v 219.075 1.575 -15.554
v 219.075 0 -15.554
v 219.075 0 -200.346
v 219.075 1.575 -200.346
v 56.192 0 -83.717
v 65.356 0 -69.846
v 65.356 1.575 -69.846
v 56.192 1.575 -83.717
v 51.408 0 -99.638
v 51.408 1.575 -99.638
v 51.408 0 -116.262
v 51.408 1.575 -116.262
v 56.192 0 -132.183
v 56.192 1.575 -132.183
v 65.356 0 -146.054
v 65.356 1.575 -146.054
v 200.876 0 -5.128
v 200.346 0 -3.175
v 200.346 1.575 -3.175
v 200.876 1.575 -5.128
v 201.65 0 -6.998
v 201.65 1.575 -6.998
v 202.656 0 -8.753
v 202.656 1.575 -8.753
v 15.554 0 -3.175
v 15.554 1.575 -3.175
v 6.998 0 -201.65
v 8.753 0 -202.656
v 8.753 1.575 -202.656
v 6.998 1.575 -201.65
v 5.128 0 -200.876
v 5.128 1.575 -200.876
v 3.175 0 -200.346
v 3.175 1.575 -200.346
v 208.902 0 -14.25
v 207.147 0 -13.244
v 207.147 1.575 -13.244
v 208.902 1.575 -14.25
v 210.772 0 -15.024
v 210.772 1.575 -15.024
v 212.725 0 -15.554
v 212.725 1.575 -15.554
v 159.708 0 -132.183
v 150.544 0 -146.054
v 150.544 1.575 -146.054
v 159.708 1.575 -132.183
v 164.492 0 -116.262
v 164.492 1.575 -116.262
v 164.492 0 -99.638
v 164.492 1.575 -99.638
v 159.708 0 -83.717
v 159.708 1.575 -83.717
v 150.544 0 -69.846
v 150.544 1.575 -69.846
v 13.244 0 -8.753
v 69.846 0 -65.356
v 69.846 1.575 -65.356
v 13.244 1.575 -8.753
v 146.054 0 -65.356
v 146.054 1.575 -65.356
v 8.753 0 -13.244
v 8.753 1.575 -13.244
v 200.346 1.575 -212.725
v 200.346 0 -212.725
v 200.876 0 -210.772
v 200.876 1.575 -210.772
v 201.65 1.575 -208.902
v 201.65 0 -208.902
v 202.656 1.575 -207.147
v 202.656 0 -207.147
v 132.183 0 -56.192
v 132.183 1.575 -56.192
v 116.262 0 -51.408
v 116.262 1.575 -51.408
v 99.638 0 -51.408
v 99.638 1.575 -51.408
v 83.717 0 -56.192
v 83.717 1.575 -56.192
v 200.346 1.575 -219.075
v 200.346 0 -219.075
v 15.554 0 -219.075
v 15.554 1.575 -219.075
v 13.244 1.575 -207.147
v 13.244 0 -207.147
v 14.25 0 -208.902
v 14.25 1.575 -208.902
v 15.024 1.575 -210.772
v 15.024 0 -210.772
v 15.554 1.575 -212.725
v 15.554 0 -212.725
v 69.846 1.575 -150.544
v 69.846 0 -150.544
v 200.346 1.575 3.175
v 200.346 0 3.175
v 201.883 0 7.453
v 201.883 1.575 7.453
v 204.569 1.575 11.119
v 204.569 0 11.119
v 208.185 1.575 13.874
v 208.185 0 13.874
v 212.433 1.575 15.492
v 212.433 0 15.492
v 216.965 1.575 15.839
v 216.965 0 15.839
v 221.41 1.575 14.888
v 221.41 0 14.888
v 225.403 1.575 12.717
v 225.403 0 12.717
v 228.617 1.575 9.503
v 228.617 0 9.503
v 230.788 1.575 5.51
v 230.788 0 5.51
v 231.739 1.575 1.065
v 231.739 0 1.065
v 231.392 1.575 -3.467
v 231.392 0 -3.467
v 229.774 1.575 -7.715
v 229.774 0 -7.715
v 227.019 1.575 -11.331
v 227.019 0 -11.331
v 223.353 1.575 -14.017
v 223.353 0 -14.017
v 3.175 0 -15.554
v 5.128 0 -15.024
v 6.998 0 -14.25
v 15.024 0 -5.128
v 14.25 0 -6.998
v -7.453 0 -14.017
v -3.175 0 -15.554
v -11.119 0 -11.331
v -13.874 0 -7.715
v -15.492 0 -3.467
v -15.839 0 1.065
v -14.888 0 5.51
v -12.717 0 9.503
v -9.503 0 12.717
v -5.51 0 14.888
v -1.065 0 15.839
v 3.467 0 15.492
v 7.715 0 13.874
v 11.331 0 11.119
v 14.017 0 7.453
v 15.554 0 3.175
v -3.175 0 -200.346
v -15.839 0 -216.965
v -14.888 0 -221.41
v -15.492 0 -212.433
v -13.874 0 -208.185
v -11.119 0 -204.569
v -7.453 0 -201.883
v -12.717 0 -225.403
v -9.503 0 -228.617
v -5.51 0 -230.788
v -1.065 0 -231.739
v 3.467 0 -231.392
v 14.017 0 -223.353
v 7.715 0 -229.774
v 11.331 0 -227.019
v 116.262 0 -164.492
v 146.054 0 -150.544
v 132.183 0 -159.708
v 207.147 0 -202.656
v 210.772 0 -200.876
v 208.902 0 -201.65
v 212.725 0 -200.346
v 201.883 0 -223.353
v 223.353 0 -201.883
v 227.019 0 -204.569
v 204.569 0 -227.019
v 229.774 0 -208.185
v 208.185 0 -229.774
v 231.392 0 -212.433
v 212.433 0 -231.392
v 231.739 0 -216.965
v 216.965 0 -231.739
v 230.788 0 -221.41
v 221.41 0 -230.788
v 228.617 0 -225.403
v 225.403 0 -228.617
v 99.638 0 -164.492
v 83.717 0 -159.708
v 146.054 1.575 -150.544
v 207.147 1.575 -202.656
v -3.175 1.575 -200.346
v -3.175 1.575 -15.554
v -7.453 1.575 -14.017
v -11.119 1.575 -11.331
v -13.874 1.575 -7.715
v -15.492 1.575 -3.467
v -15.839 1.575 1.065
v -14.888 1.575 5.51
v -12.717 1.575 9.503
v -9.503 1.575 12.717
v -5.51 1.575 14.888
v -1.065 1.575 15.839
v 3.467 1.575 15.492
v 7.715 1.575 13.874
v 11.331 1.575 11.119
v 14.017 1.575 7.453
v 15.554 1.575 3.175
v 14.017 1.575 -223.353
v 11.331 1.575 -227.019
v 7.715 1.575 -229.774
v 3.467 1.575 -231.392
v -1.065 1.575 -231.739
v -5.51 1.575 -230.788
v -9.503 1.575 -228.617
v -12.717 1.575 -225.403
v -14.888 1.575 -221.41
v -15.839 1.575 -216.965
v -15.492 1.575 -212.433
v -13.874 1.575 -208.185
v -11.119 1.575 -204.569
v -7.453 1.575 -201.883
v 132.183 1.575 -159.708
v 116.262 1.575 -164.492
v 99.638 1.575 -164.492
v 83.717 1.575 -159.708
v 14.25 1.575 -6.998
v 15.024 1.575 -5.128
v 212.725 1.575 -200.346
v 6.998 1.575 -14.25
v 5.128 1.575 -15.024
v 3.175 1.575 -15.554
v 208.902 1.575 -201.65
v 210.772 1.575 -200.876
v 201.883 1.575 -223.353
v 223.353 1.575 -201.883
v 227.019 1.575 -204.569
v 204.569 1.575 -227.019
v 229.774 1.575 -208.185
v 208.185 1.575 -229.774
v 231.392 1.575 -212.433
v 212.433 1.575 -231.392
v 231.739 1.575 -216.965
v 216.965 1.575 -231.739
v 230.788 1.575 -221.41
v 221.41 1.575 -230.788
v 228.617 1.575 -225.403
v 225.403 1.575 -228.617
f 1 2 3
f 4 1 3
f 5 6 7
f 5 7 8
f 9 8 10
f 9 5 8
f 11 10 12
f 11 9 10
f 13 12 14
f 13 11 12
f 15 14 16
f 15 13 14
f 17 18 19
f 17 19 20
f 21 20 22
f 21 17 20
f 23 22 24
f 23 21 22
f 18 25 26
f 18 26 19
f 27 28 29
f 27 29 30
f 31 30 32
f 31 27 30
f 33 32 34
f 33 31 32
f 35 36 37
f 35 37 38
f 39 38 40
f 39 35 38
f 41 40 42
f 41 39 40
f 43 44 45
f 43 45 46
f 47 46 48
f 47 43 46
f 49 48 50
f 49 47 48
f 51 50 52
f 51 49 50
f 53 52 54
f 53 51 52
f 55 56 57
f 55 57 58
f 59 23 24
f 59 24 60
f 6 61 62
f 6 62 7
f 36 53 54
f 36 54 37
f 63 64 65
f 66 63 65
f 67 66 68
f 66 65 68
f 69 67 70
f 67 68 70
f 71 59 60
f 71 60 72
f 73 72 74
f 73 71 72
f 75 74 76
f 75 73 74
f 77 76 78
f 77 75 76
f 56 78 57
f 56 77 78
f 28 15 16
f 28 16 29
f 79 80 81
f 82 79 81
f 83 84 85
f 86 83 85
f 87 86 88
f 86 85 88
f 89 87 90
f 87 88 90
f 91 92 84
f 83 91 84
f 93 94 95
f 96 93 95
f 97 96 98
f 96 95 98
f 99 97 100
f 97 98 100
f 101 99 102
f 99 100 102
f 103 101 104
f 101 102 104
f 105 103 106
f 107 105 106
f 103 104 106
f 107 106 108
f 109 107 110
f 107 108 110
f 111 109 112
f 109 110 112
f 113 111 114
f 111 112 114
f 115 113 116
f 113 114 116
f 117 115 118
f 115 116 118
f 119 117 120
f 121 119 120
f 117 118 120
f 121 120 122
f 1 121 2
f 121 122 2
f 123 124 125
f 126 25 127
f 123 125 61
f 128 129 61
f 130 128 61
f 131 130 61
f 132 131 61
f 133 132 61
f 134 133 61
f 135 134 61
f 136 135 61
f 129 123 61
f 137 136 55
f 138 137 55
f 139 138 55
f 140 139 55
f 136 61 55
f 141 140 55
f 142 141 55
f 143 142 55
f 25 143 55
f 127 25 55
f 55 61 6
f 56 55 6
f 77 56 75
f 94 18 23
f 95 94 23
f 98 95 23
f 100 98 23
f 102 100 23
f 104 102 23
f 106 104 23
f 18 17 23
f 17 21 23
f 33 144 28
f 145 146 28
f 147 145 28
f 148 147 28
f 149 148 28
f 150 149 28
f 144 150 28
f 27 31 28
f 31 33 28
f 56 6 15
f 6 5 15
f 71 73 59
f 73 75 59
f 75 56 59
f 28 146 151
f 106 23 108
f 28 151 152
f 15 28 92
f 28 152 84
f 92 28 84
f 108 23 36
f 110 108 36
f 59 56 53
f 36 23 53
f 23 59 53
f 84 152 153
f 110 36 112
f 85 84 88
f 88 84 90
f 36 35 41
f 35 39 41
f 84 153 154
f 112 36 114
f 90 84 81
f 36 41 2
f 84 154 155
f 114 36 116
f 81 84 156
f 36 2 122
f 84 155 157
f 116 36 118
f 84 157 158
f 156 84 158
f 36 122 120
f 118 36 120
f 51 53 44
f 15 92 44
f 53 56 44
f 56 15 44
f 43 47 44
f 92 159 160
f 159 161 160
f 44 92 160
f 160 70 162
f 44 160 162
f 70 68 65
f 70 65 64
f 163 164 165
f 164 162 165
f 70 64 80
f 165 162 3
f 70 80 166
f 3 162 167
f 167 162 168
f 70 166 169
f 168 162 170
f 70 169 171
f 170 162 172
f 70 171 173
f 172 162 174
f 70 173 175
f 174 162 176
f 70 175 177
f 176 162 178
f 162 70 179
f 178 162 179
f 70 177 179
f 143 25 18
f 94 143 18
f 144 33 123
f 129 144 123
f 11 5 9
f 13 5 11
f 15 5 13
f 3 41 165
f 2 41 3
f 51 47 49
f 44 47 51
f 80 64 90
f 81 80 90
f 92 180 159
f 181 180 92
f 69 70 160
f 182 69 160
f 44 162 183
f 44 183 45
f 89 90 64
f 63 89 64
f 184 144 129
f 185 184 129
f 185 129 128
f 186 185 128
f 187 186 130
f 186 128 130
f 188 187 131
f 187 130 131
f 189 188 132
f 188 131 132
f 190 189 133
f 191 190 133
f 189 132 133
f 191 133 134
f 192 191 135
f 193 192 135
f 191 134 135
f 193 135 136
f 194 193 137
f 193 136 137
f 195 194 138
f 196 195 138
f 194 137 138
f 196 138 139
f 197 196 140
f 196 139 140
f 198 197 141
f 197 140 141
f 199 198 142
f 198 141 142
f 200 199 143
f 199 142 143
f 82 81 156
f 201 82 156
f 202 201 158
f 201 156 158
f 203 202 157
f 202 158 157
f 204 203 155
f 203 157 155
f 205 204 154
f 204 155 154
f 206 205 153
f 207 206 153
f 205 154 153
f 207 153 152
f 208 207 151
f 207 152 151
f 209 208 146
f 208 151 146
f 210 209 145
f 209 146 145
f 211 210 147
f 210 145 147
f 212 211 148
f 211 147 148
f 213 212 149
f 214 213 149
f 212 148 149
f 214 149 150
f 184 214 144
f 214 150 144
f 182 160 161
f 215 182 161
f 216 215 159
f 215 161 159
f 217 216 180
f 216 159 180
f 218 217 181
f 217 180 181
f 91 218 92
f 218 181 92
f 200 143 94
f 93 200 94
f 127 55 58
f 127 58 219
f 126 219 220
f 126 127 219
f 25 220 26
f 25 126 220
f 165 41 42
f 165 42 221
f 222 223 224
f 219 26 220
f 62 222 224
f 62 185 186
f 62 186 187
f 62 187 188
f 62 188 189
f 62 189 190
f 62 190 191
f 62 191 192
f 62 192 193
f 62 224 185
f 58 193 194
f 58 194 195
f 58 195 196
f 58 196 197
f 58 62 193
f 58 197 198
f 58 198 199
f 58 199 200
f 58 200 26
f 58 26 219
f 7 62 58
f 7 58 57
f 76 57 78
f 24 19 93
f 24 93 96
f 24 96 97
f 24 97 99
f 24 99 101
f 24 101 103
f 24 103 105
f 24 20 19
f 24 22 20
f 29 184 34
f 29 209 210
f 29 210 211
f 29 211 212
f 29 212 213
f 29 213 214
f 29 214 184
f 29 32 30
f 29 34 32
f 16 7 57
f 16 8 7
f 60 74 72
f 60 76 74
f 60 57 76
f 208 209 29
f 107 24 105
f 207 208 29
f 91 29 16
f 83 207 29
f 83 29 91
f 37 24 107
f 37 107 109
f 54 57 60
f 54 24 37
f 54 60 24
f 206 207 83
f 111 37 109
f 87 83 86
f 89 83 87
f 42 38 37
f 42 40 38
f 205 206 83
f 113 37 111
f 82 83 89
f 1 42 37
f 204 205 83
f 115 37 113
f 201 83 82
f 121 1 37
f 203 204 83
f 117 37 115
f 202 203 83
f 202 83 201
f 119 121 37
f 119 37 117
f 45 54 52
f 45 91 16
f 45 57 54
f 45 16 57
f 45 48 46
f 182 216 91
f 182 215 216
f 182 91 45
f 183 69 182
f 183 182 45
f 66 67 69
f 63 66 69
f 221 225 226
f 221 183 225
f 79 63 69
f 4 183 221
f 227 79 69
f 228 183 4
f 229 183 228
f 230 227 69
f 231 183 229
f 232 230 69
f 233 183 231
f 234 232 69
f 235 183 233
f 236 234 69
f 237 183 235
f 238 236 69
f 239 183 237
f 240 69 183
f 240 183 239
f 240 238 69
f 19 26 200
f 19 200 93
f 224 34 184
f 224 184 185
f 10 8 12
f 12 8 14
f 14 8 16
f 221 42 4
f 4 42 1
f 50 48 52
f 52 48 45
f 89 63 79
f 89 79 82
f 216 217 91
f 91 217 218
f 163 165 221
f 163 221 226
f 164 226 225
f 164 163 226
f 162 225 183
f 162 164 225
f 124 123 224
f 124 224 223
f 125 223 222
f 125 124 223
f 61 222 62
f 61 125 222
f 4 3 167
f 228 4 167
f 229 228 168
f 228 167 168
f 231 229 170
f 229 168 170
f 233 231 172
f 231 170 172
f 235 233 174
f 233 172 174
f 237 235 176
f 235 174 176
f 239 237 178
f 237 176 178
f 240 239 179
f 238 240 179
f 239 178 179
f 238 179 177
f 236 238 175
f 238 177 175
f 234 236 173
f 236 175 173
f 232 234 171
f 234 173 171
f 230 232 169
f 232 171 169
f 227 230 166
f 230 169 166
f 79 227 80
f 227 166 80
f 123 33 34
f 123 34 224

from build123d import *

# Parameters (mm, degrees)
BOSS_EXTRUDE1_DEPTH = 1.5748


with BuildPart() as part:
    # Sketch1 → Boss-Extrude1 (new body)
    with BuildSketch(Plane(origin=(0, 0, 0), x_dir=(1, 0, 0), z_dir=(0, 1, 0))):
        with BuildLine():
            Line((219.075, 15.554259867), (219.075, 200.345740133))
            ThreePointArc((219.075, 200.345740133), (227.125320151, 227.125320151), (200.345740133, 219.075))
            Line((200.345740133, 219.075), (15.554259867, 219.075))
            ThreePointArc((15.554259867, 219.075), (-11.225320151, 227.125320151), (-3.175, 200.345740133))
            Line((-3.175, 200.345740133), (-3.175, 15.554259867))
            ThreePointArc((-3.175, 15.554259867), (-11.225320151, -11.225320151), (15.554259867, -3.175))
            Line((15.554259867, -3.175), (200.345740133, -3.175))
            ThreePointArc((200.345740133, -3.175), (227.125320151, -11.225320151), (219.075, 15.554259867))
        make_face()
        with BuildLine():
            Line((15.554259867, 3.175), (200.345740133, 3.175))
            ThreePointArc((200.345740133, 3.175), (201.233412421, 6.075099489), (202.656413342, 8.753458598))
            Line((202.656413342, 8.753458598), (146.053677431, 65.356194509))
            ThreePointArc((146.053677431, 65.356194509), (107.95, 50.8), (69.846322569, 65.356194509))
            Line((69.846322569, 65.356194509), (13.243586658, 8.753458598))
            ThreePointArc((13.243586658, 8.753458598), (14.666587579, 6.075099489), (15.554259867, 3.175))
        make_face(mode=Mode.SUBTRACT)
        with BuildLine():
            Line((8.753458598, 13.243586658), (65.356194509, 69.846322569))
            ThreePointArc((65.356194509, 69.846322569), (50.8, 107.95), (65.356194509, 146.053677431))
            Line((65.356194509, 146.053677431), (8.753458598, 202.656413342))
            ThreePointArc((8.753458598, 202.656413342), (6.075099489, 201.233412421), (3.175, 200.345740133))
            Line((3.175, 200.345740133), (3.175, 15.554259867))
            ThreePointArc((3.175, 15.554259867), (6.075099489, 14.666587579), (8.753458598, 13.243586658))
        make_face(mode=Mode.SUBTRACT)
        with BuildLine():
            Line((212.725, 15.554259867), (212.725, 200.345740133))
            ThreePointArc((212.725, 200.345740133), (209.824900511, 201.233412421), (207.146541402, 202.656413342))
            Line((207.146541402, 202.656413342), (150.543805491, 146.053677431))
            ThreePointArc((150.543805491, 146.053677431), (165.1, 107.95), (150.543805491, 69.846322569))
            Line((150.543805491, 69.846322569), (207.146541402, 13.243586658))
            ThreePointArc((207.146541402, 13.243586658), (209.824900511, 14.666587579), (212.725, 15.554259867))
        make_face(mode=Mode.SUBTRACT)
        with BuildLine():
            Line((15.554259867, 212.725), (200.345740133, 212.725))
            ThreePointArc((200.345740133, 212.725), (201.233412421, 209.824900511), (202.656413342, 207.146541402))
            Line((202.656413342, 207.146541402), (146.053677431, 150.543805491))
            ThreePointArc((146.053677431, 150.543805491), (107.95, 165.1), (69.846322569, 150.543805491))
            Line((69.846322569, 150.543805491), (13.243586658, 207.146541402))
            ThreePointArc((13.243586658, 207.146541402), (14.666587579, 209.824900511), (15.554259867, 212.725))
        make_face(mode=Mode.SUBTRACT)
    extrude(amount=BOSS_EXTRUDE1_DEPTH)


solid = part.part
